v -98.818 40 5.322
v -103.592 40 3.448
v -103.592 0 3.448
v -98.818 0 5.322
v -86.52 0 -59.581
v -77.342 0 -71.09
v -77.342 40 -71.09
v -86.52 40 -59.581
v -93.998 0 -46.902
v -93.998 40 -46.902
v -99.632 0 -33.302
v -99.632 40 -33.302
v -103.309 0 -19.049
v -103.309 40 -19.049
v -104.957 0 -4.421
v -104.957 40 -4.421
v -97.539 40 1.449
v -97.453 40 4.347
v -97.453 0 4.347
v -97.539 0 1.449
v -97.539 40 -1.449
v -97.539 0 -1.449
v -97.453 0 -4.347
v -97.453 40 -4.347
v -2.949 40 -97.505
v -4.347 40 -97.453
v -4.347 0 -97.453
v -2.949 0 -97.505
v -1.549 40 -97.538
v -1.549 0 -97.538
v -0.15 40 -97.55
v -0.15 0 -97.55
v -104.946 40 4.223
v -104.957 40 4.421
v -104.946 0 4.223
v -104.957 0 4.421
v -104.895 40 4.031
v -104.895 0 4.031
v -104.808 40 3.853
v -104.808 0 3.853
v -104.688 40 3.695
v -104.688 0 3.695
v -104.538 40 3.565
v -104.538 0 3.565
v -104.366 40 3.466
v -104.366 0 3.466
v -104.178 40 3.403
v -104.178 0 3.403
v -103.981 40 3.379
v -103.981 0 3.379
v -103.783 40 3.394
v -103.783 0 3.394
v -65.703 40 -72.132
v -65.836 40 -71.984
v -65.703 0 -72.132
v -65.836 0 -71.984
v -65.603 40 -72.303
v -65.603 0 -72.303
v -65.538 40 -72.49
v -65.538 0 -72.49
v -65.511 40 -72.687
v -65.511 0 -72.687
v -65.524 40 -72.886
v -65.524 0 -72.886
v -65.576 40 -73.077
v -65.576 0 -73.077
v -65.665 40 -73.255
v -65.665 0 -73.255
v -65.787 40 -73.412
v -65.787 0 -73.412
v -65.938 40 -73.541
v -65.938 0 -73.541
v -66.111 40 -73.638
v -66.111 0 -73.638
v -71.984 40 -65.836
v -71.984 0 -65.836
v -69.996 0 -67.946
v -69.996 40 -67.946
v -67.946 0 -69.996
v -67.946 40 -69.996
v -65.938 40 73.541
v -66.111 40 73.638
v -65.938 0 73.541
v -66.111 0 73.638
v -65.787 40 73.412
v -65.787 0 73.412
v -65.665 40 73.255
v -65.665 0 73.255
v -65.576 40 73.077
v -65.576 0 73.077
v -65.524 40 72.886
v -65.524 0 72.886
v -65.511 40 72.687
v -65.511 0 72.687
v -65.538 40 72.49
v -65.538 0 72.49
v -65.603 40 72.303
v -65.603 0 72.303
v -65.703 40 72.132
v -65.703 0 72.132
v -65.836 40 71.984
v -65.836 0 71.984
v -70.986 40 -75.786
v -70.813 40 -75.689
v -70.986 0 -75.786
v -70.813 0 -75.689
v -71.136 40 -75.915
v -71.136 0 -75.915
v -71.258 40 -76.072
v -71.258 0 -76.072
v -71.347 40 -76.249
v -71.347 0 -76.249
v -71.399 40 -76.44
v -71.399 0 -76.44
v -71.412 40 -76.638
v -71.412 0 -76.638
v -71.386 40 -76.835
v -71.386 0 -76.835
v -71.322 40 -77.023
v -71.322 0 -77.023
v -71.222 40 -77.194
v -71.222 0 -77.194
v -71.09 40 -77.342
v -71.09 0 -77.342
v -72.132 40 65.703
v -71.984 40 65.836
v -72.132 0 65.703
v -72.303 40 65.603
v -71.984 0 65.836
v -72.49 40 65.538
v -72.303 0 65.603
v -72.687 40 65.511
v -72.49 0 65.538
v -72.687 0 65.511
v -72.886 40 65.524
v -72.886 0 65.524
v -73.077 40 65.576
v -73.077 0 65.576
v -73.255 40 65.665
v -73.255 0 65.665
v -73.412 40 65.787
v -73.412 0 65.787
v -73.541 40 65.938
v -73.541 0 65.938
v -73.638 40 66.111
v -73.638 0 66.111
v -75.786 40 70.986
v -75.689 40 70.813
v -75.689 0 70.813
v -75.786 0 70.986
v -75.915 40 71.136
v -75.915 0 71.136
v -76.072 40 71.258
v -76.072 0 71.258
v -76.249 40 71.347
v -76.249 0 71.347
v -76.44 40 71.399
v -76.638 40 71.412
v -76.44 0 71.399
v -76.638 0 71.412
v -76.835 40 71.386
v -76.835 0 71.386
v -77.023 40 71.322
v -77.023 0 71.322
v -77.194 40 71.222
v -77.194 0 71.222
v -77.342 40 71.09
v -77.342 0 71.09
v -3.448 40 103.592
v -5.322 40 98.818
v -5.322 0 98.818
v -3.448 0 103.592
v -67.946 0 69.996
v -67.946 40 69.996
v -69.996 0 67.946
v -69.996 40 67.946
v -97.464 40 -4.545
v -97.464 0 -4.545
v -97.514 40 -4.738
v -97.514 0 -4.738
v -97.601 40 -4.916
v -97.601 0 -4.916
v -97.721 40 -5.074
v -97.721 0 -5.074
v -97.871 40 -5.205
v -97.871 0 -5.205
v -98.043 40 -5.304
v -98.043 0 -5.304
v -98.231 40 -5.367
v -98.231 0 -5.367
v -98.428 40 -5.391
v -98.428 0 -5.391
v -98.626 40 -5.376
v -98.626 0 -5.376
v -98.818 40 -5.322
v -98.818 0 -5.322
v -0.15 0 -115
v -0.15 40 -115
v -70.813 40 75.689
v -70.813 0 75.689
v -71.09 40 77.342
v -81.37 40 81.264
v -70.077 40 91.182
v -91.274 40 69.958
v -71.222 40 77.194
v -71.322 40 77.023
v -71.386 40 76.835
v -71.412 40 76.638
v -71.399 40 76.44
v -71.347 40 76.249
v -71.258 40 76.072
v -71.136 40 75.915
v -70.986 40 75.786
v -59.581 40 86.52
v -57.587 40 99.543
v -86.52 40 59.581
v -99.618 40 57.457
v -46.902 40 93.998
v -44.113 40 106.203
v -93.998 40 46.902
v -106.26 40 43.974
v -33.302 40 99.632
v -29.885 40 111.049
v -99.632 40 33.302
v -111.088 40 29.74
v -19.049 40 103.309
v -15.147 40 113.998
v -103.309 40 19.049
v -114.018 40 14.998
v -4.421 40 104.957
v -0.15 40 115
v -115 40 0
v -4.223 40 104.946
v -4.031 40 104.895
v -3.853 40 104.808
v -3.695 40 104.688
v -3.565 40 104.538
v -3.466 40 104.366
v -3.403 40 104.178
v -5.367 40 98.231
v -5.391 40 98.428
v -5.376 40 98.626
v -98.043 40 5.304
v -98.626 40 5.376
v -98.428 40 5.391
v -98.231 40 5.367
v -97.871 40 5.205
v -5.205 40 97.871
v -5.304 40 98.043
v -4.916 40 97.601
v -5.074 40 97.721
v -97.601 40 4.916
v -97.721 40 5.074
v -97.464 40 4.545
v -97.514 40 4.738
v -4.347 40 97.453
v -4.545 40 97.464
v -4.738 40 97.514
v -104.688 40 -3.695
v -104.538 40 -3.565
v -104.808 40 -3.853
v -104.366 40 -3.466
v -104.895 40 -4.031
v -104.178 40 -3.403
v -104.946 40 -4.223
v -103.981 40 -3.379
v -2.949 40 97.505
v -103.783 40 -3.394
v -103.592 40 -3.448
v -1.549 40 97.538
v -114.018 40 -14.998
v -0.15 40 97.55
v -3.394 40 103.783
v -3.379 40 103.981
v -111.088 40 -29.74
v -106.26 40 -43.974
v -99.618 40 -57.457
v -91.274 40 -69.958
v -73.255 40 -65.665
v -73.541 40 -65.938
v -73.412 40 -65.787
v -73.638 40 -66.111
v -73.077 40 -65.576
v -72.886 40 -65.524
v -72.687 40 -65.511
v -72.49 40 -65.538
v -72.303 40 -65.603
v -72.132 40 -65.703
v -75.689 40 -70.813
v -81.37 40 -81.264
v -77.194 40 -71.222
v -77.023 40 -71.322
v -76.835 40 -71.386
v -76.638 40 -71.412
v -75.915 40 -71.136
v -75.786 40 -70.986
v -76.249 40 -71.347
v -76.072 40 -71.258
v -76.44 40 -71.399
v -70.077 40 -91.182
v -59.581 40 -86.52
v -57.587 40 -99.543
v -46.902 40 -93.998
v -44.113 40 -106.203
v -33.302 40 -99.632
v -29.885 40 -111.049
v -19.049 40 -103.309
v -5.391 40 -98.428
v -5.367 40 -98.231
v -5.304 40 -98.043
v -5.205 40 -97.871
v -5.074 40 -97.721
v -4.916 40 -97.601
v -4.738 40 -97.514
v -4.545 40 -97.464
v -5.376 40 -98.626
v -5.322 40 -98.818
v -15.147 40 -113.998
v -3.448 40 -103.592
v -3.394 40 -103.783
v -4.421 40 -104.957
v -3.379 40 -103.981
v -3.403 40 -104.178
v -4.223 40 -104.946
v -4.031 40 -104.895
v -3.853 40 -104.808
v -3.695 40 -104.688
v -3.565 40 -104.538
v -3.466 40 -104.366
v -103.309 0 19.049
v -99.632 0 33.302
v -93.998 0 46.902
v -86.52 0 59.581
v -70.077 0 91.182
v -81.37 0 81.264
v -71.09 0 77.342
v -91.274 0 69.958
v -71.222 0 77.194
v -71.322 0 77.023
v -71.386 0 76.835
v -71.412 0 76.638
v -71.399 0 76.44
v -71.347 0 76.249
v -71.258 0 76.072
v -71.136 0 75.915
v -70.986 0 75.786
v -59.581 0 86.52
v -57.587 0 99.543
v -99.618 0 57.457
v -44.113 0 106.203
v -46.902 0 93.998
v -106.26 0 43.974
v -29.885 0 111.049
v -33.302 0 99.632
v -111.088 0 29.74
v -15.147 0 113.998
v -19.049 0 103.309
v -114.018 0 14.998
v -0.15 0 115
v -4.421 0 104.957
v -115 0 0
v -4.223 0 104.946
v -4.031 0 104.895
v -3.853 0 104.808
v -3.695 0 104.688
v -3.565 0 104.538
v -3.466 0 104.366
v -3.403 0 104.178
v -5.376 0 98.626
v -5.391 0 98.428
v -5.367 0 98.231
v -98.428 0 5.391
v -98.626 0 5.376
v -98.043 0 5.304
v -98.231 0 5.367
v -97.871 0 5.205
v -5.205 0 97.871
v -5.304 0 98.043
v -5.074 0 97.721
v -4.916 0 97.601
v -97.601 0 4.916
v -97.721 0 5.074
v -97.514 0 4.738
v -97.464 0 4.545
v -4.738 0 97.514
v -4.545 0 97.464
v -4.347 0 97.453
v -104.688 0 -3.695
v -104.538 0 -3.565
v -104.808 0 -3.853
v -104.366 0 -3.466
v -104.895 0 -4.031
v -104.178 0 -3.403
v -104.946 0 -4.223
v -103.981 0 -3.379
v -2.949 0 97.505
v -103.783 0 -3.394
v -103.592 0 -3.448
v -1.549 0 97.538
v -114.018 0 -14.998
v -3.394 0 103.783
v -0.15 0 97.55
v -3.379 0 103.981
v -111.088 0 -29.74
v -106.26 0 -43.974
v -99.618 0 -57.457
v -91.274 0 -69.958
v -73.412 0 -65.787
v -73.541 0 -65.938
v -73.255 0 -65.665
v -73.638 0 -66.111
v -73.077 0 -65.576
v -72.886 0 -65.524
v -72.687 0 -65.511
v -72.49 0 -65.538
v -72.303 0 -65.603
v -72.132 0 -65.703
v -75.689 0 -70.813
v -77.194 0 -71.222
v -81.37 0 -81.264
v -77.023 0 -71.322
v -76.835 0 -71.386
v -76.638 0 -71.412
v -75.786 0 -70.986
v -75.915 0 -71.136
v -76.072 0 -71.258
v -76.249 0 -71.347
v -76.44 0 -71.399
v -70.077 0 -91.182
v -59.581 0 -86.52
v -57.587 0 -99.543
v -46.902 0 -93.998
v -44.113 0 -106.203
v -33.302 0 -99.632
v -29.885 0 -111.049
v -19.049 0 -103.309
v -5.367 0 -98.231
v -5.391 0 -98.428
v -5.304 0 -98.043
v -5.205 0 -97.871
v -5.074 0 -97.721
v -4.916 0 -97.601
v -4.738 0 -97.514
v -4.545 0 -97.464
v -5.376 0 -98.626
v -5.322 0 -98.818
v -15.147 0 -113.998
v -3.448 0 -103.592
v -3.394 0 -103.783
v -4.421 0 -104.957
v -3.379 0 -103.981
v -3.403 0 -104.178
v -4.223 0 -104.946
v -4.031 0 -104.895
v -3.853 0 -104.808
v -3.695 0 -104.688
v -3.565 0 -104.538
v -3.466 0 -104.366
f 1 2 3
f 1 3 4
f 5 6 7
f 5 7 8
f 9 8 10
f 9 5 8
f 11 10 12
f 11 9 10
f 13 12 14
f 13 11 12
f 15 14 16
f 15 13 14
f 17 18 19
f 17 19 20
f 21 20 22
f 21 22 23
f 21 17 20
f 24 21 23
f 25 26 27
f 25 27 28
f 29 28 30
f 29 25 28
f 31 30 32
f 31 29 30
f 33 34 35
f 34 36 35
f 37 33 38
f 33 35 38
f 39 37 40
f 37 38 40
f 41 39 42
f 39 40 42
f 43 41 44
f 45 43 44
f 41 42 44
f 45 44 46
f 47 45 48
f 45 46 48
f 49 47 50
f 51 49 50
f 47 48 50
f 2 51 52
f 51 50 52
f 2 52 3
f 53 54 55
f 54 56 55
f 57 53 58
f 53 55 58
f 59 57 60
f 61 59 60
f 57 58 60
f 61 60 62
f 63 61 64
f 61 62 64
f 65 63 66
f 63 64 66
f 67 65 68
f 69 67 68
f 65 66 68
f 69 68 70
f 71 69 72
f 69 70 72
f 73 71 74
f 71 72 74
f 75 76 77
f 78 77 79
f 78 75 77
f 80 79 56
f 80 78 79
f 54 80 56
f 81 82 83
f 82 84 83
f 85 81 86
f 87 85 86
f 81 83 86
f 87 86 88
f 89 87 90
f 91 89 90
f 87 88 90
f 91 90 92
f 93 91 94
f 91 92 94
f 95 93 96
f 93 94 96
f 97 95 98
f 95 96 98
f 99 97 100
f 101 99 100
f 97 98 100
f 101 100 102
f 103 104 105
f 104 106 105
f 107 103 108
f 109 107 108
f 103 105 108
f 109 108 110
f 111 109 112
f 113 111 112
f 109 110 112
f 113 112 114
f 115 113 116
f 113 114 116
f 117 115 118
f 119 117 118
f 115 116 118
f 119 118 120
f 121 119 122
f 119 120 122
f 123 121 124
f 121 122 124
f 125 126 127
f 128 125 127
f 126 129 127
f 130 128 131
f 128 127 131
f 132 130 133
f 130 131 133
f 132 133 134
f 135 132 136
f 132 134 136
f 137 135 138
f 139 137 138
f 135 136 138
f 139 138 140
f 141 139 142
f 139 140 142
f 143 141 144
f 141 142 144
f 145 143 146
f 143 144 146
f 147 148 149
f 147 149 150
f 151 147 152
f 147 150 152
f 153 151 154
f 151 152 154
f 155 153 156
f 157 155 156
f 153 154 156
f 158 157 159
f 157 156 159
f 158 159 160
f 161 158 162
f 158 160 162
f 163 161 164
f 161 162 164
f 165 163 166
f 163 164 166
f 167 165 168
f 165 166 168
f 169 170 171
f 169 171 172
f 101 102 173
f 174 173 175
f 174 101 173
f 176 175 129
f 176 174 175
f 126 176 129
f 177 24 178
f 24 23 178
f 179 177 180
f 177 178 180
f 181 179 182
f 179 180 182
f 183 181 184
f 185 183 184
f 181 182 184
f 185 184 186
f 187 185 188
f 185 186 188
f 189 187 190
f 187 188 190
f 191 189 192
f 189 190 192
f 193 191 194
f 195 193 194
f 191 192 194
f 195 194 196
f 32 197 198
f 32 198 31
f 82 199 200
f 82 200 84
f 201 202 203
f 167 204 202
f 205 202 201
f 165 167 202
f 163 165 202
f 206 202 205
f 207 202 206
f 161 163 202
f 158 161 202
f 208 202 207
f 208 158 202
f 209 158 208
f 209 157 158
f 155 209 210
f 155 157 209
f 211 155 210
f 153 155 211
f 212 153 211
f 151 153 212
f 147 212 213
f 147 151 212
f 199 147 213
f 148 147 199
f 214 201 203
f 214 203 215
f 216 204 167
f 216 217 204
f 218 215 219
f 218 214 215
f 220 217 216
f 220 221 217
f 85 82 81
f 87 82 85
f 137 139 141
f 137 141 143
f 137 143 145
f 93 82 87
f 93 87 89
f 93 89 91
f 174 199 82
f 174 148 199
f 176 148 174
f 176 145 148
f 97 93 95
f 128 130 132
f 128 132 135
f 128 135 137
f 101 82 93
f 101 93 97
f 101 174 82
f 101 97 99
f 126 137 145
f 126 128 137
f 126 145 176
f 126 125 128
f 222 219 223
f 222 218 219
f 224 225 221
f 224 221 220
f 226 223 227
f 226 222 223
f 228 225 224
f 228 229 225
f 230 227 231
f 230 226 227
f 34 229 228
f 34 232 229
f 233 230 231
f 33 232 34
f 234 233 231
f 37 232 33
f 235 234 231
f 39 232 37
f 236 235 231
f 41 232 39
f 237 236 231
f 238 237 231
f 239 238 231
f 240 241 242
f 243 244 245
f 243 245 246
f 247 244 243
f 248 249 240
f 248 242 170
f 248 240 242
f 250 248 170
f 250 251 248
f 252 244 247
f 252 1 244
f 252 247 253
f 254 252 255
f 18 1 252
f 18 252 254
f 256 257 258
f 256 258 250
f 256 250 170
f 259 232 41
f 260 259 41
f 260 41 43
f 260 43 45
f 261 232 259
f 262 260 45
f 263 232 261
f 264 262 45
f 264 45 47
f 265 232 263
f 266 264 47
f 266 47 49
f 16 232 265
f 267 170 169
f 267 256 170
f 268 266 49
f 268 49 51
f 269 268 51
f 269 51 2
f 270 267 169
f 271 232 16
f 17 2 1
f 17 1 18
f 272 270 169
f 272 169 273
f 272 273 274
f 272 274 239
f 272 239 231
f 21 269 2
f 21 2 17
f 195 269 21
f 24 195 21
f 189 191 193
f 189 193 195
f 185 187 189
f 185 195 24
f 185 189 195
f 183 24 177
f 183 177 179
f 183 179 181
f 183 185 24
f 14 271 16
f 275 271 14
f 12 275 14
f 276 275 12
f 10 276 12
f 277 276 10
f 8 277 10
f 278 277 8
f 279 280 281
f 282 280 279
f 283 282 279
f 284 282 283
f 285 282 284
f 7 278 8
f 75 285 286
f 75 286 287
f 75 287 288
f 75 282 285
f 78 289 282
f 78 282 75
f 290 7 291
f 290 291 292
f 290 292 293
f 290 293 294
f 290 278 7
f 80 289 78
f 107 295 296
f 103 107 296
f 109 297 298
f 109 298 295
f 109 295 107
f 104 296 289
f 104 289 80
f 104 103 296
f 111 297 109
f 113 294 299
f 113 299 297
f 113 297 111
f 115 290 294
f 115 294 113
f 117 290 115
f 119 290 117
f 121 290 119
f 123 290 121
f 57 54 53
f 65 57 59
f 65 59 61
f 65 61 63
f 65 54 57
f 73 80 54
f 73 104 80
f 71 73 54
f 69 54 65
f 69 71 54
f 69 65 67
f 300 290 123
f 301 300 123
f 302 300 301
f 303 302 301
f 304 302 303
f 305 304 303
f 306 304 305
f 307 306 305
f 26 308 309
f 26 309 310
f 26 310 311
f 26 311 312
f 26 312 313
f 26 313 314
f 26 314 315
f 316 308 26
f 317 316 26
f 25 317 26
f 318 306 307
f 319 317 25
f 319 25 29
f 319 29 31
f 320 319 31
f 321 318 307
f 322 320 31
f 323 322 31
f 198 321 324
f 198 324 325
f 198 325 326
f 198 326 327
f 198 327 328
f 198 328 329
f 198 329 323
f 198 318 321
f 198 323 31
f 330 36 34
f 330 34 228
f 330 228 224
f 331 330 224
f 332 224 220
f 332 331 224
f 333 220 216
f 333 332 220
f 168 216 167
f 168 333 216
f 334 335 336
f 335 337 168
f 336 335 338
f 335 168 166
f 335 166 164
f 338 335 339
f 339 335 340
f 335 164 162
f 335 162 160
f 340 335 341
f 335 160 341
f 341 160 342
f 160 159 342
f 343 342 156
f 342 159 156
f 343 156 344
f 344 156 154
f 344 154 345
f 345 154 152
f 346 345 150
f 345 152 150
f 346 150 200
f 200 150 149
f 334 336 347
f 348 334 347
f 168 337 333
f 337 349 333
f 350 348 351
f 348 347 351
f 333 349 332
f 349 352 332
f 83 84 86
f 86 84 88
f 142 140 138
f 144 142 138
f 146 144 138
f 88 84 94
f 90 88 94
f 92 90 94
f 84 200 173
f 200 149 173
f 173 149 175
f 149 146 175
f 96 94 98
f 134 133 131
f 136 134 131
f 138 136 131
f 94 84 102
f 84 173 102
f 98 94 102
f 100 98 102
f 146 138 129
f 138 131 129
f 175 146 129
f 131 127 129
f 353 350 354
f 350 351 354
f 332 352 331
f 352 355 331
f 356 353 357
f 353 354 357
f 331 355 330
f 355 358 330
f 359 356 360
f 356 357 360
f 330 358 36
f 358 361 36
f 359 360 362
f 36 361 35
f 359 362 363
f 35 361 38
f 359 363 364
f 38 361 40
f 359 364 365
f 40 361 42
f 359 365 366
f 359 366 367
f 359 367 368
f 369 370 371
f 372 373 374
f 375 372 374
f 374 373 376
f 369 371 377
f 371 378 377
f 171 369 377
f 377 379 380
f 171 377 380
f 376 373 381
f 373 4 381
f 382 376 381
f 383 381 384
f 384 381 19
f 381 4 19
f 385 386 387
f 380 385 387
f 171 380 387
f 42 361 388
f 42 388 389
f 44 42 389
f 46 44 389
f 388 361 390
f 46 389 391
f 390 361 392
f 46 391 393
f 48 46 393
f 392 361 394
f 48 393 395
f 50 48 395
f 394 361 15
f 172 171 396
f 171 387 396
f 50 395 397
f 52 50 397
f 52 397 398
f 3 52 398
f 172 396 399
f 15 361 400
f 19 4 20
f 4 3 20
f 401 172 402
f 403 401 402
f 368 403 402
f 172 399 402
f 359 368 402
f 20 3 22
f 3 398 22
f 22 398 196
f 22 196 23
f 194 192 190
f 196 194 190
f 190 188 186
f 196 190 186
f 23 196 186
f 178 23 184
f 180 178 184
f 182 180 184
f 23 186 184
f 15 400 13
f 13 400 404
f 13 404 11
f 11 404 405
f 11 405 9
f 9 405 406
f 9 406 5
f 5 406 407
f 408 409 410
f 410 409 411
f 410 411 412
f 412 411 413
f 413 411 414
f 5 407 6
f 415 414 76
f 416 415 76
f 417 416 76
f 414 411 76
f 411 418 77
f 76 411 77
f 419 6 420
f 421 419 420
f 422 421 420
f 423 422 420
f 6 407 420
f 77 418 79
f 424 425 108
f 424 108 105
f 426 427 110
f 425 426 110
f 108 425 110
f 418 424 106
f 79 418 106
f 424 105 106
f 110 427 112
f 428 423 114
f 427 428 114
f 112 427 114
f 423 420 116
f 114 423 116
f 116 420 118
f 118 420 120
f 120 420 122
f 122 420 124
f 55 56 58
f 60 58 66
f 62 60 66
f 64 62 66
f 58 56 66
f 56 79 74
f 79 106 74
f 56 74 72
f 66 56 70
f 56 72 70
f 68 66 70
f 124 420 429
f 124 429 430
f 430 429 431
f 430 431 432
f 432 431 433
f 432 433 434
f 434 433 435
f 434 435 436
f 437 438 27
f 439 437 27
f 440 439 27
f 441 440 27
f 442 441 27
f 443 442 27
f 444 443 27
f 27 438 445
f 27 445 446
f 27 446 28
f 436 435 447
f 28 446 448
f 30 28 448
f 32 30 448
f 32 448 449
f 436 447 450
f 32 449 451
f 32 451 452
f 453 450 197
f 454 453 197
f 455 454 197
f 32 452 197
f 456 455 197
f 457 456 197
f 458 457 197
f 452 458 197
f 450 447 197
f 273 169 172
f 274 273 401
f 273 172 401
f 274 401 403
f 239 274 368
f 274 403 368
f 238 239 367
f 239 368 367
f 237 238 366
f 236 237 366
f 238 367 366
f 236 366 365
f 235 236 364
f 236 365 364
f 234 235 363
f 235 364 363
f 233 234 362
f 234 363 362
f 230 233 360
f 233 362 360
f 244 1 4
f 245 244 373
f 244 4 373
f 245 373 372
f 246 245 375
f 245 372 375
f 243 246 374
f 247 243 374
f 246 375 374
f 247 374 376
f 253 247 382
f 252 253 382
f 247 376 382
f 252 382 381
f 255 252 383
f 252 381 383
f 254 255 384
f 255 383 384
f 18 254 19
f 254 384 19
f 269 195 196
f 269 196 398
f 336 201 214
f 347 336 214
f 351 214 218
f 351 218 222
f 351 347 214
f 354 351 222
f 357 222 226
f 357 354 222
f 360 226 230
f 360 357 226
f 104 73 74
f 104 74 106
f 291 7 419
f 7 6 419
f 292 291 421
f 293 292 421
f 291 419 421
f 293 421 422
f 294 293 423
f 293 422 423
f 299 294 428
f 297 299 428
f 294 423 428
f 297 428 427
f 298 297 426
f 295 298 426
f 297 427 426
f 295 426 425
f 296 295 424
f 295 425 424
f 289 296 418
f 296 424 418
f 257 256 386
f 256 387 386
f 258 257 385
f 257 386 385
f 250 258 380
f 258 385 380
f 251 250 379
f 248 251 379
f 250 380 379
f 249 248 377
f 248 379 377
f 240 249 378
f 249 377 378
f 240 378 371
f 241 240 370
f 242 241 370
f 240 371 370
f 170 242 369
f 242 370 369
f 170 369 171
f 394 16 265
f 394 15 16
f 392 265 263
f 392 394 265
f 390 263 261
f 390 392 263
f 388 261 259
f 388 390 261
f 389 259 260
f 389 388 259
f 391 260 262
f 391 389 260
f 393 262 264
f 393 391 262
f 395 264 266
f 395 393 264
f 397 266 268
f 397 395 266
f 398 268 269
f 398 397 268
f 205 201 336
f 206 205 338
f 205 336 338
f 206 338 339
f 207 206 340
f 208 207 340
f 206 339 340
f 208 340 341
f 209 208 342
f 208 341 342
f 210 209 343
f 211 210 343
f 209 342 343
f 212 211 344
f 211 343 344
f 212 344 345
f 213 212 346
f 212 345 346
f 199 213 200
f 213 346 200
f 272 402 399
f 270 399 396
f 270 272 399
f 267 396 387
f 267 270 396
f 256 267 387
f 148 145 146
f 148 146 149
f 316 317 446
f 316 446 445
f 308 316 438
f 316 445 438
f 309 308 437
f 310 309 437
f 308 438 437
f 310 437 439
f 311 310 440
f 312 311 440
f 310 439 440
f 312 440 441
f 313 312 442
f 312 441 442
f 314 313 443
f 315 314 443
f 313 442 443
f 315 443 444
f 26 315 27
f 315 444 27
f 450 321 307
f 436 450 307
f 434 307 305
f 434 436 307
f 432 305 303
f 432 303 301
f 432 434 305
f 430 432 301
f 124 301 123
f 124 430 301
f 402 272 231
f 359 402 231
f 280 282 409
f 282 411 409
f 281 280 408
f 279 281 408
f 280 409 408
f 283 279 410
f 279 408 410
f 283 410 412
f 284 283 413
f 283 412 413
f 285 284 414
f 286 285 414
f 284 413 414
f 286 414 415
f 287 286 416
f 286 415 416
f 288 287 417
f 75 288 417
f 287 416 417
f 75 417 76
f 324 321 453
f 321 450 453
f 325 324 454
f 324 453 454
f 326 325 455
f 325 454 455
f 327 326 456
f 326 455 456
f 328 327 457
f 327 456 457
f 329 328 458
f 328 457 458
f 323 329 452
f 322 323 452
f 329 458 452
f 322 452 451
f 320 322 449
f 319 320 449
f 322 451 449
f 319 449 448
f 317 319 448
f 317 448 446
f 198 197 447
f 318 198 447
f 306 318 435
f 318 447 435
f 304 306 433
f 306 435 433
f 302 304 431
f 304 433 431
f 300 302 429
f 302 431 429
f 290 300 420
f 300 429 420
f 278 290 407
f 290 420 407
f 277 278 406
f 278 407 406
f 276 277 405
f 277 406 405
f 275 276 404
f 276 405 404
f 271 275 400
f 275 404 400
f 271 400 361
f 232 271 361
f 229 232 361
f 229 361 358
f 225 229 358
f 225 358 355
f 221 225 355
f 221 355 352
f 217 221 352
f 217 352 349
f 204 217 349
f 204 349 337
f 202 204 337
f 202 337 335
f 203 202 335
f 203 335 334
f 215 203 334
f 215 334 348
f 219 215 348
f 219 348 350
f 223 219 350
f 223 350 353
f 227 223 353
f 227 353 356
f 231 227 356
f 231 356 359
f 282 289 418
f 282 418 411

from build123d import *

# Parameters (mm, degrees)
SKETCH1_R                = 115
SKETCH1_R_2              = 105.05
BOSS_EXTRUDE1_DEPTH      = 40
BOSS_EXTRUDE2_DEPTH      = 40
FILLET2_R                = 1
CIRPATTERN2_COUNT        = 8
FILLET2_OF_CIRPATTERN2_R = 1
CUT_EXTRUDE2_DEPTH       = 41


with BuildPart() as part:
    # Sketch1 → Boss-Extrude1 (new body)
    with BuildSketch(Plane(origin=(0, 0, 0), x_dir=(1, 0, 0), z_dir=(0, 1, 0))):
        Circle(SKETCH1_R)
        Circle(SKETCH1_R_2, mode=Mode.SUBTRACT)
    extrude(amount=BOSS_EXTRUDE1_DEPTH)

    # Sketch2 → Boss-Extrude2 (add, through all)
    with BuildSketch(Plane(origin=(0, 40, 0), x_dir=(1, 0, 0), z_dir=(0, 1, 0))):
        with BuildLine():
            ThreePointArc((2.891374007, 105.010201678), (0, 105.05), (-2.891374007, 105.010201678))
            Line((-2.891374007, 105.010201678), (-5.889932008, 97.372024735))
            ThreePointArc((-5.889932008, 97.372024735), (0, 97.55), (5.889932008, 97.372024735))
            Line((5.889932008, 97.372024735), (2.891374007, 105.010201678))
        make_face()
    boss_extrude2 = extrude(amount=-BOSS_EXTRUDE2_DEPTH)

    # Fillet2
    fillet2_edges = [part.edges().sort_by_distance(p)[0] for p in [
        (5.889932008, 20, -97.372024735),
        (-5.889932008, 20, -97.372024735),
        (-2.891374007, 20, -105.010201678),
        (2.891374007, 20, -105.010201678),
    ]]
    fillet(fillet2_edges, radius=FILLET2_R)

    # CirPattern2: Boss-Extrude2 ×8 about axis
    cirpattern2_axis = Axis((0, 0, 0), (0, 1, 0))
    for i in range(1, CIRPATTERN2_COUNT):
        add(boss_extrude2.rotate(cirpattern2_axis, i * 360 / CIRPATTERN2_COUNT))

    # Fillet2 of CirPattern2
    fillet2_of_cirpattern2_edges = [part.edges().sort_by_distance(p)[0] for p in [
        (-64.687608124, 20, -73.017229852),
        (-73.017229852, 20, -64.687608124),
        (-76.297935867, 20, -72.208915532),
        (-72.208915532, 20, -76.297935867),
        (-97.372024735, 20, -5.889932008),
        (-97.372024735, 20, 5.889932008),
        (-105.010201678, 20, 2.891374007),
        (-105.010201678, 20, -2.891374007),
        (-73.017229852, 20, 64.687608124),
        (-64.687608124, 20, 73.017229852),
        (-72.208915532, 20, 76.297935867),
        (-76.297935867, 20, 72.208915532),
        (-5.889932008, 20, 97.372024735),
        (5.889932008, 20, 97.372024735),
        (2.891374007, 20, 105.010201678),
        (-2.891374007, 20, 105.010201678),
        (64.687608124, 20, 73.017229852),
        (73.017229852, 20, 64.687608124),
        (76.297935867, 20, 72.208915532),
        (72.208915532, 20, 76.297935867),
        (97.372024735, 20, 5.889932008),
        (97.372024735, 20, -5.889932008),
        (105.010201678, 20, -2.891374007),
        (105.010201678, 20, 2.891374007),
        (73.017229852, 20, -64.687608124),
        (64.687608124, 20, -73.017229852),
        (72.208915532, 20, -76.297935867),
        (76.297935867, 20, -72.208915532),
    ]]
    fillet(fillet2_of_cirpattern2_edges, radius=FILLET2_OF_CIRPATTERN2_R)

    # Sketch3 → Cut-Extrude2 (cut, through all)
    with BuildSketch(Plane(origin=(0, 40, 0), x_dir=(1, 0, 0), z_dir=(0, 1, 0))):
        with BuildLine():
            Line((-0.15, 117.349449893), (-0.15, -117.349449893))
            ThreePointArc((-0.15, -117.349449893), (82.828591788, -82.978591788), (117.199449893, 0))
            ThreePointArc((117.199449893, 0), (82.828591788, 82.978591788), (-0.15, 117.349449893))
        make_face()
    extrude(amount=-CUT_EXTRUDE2_DEPTH, mode=Mode.SUBTRACT)


solid = part.part
